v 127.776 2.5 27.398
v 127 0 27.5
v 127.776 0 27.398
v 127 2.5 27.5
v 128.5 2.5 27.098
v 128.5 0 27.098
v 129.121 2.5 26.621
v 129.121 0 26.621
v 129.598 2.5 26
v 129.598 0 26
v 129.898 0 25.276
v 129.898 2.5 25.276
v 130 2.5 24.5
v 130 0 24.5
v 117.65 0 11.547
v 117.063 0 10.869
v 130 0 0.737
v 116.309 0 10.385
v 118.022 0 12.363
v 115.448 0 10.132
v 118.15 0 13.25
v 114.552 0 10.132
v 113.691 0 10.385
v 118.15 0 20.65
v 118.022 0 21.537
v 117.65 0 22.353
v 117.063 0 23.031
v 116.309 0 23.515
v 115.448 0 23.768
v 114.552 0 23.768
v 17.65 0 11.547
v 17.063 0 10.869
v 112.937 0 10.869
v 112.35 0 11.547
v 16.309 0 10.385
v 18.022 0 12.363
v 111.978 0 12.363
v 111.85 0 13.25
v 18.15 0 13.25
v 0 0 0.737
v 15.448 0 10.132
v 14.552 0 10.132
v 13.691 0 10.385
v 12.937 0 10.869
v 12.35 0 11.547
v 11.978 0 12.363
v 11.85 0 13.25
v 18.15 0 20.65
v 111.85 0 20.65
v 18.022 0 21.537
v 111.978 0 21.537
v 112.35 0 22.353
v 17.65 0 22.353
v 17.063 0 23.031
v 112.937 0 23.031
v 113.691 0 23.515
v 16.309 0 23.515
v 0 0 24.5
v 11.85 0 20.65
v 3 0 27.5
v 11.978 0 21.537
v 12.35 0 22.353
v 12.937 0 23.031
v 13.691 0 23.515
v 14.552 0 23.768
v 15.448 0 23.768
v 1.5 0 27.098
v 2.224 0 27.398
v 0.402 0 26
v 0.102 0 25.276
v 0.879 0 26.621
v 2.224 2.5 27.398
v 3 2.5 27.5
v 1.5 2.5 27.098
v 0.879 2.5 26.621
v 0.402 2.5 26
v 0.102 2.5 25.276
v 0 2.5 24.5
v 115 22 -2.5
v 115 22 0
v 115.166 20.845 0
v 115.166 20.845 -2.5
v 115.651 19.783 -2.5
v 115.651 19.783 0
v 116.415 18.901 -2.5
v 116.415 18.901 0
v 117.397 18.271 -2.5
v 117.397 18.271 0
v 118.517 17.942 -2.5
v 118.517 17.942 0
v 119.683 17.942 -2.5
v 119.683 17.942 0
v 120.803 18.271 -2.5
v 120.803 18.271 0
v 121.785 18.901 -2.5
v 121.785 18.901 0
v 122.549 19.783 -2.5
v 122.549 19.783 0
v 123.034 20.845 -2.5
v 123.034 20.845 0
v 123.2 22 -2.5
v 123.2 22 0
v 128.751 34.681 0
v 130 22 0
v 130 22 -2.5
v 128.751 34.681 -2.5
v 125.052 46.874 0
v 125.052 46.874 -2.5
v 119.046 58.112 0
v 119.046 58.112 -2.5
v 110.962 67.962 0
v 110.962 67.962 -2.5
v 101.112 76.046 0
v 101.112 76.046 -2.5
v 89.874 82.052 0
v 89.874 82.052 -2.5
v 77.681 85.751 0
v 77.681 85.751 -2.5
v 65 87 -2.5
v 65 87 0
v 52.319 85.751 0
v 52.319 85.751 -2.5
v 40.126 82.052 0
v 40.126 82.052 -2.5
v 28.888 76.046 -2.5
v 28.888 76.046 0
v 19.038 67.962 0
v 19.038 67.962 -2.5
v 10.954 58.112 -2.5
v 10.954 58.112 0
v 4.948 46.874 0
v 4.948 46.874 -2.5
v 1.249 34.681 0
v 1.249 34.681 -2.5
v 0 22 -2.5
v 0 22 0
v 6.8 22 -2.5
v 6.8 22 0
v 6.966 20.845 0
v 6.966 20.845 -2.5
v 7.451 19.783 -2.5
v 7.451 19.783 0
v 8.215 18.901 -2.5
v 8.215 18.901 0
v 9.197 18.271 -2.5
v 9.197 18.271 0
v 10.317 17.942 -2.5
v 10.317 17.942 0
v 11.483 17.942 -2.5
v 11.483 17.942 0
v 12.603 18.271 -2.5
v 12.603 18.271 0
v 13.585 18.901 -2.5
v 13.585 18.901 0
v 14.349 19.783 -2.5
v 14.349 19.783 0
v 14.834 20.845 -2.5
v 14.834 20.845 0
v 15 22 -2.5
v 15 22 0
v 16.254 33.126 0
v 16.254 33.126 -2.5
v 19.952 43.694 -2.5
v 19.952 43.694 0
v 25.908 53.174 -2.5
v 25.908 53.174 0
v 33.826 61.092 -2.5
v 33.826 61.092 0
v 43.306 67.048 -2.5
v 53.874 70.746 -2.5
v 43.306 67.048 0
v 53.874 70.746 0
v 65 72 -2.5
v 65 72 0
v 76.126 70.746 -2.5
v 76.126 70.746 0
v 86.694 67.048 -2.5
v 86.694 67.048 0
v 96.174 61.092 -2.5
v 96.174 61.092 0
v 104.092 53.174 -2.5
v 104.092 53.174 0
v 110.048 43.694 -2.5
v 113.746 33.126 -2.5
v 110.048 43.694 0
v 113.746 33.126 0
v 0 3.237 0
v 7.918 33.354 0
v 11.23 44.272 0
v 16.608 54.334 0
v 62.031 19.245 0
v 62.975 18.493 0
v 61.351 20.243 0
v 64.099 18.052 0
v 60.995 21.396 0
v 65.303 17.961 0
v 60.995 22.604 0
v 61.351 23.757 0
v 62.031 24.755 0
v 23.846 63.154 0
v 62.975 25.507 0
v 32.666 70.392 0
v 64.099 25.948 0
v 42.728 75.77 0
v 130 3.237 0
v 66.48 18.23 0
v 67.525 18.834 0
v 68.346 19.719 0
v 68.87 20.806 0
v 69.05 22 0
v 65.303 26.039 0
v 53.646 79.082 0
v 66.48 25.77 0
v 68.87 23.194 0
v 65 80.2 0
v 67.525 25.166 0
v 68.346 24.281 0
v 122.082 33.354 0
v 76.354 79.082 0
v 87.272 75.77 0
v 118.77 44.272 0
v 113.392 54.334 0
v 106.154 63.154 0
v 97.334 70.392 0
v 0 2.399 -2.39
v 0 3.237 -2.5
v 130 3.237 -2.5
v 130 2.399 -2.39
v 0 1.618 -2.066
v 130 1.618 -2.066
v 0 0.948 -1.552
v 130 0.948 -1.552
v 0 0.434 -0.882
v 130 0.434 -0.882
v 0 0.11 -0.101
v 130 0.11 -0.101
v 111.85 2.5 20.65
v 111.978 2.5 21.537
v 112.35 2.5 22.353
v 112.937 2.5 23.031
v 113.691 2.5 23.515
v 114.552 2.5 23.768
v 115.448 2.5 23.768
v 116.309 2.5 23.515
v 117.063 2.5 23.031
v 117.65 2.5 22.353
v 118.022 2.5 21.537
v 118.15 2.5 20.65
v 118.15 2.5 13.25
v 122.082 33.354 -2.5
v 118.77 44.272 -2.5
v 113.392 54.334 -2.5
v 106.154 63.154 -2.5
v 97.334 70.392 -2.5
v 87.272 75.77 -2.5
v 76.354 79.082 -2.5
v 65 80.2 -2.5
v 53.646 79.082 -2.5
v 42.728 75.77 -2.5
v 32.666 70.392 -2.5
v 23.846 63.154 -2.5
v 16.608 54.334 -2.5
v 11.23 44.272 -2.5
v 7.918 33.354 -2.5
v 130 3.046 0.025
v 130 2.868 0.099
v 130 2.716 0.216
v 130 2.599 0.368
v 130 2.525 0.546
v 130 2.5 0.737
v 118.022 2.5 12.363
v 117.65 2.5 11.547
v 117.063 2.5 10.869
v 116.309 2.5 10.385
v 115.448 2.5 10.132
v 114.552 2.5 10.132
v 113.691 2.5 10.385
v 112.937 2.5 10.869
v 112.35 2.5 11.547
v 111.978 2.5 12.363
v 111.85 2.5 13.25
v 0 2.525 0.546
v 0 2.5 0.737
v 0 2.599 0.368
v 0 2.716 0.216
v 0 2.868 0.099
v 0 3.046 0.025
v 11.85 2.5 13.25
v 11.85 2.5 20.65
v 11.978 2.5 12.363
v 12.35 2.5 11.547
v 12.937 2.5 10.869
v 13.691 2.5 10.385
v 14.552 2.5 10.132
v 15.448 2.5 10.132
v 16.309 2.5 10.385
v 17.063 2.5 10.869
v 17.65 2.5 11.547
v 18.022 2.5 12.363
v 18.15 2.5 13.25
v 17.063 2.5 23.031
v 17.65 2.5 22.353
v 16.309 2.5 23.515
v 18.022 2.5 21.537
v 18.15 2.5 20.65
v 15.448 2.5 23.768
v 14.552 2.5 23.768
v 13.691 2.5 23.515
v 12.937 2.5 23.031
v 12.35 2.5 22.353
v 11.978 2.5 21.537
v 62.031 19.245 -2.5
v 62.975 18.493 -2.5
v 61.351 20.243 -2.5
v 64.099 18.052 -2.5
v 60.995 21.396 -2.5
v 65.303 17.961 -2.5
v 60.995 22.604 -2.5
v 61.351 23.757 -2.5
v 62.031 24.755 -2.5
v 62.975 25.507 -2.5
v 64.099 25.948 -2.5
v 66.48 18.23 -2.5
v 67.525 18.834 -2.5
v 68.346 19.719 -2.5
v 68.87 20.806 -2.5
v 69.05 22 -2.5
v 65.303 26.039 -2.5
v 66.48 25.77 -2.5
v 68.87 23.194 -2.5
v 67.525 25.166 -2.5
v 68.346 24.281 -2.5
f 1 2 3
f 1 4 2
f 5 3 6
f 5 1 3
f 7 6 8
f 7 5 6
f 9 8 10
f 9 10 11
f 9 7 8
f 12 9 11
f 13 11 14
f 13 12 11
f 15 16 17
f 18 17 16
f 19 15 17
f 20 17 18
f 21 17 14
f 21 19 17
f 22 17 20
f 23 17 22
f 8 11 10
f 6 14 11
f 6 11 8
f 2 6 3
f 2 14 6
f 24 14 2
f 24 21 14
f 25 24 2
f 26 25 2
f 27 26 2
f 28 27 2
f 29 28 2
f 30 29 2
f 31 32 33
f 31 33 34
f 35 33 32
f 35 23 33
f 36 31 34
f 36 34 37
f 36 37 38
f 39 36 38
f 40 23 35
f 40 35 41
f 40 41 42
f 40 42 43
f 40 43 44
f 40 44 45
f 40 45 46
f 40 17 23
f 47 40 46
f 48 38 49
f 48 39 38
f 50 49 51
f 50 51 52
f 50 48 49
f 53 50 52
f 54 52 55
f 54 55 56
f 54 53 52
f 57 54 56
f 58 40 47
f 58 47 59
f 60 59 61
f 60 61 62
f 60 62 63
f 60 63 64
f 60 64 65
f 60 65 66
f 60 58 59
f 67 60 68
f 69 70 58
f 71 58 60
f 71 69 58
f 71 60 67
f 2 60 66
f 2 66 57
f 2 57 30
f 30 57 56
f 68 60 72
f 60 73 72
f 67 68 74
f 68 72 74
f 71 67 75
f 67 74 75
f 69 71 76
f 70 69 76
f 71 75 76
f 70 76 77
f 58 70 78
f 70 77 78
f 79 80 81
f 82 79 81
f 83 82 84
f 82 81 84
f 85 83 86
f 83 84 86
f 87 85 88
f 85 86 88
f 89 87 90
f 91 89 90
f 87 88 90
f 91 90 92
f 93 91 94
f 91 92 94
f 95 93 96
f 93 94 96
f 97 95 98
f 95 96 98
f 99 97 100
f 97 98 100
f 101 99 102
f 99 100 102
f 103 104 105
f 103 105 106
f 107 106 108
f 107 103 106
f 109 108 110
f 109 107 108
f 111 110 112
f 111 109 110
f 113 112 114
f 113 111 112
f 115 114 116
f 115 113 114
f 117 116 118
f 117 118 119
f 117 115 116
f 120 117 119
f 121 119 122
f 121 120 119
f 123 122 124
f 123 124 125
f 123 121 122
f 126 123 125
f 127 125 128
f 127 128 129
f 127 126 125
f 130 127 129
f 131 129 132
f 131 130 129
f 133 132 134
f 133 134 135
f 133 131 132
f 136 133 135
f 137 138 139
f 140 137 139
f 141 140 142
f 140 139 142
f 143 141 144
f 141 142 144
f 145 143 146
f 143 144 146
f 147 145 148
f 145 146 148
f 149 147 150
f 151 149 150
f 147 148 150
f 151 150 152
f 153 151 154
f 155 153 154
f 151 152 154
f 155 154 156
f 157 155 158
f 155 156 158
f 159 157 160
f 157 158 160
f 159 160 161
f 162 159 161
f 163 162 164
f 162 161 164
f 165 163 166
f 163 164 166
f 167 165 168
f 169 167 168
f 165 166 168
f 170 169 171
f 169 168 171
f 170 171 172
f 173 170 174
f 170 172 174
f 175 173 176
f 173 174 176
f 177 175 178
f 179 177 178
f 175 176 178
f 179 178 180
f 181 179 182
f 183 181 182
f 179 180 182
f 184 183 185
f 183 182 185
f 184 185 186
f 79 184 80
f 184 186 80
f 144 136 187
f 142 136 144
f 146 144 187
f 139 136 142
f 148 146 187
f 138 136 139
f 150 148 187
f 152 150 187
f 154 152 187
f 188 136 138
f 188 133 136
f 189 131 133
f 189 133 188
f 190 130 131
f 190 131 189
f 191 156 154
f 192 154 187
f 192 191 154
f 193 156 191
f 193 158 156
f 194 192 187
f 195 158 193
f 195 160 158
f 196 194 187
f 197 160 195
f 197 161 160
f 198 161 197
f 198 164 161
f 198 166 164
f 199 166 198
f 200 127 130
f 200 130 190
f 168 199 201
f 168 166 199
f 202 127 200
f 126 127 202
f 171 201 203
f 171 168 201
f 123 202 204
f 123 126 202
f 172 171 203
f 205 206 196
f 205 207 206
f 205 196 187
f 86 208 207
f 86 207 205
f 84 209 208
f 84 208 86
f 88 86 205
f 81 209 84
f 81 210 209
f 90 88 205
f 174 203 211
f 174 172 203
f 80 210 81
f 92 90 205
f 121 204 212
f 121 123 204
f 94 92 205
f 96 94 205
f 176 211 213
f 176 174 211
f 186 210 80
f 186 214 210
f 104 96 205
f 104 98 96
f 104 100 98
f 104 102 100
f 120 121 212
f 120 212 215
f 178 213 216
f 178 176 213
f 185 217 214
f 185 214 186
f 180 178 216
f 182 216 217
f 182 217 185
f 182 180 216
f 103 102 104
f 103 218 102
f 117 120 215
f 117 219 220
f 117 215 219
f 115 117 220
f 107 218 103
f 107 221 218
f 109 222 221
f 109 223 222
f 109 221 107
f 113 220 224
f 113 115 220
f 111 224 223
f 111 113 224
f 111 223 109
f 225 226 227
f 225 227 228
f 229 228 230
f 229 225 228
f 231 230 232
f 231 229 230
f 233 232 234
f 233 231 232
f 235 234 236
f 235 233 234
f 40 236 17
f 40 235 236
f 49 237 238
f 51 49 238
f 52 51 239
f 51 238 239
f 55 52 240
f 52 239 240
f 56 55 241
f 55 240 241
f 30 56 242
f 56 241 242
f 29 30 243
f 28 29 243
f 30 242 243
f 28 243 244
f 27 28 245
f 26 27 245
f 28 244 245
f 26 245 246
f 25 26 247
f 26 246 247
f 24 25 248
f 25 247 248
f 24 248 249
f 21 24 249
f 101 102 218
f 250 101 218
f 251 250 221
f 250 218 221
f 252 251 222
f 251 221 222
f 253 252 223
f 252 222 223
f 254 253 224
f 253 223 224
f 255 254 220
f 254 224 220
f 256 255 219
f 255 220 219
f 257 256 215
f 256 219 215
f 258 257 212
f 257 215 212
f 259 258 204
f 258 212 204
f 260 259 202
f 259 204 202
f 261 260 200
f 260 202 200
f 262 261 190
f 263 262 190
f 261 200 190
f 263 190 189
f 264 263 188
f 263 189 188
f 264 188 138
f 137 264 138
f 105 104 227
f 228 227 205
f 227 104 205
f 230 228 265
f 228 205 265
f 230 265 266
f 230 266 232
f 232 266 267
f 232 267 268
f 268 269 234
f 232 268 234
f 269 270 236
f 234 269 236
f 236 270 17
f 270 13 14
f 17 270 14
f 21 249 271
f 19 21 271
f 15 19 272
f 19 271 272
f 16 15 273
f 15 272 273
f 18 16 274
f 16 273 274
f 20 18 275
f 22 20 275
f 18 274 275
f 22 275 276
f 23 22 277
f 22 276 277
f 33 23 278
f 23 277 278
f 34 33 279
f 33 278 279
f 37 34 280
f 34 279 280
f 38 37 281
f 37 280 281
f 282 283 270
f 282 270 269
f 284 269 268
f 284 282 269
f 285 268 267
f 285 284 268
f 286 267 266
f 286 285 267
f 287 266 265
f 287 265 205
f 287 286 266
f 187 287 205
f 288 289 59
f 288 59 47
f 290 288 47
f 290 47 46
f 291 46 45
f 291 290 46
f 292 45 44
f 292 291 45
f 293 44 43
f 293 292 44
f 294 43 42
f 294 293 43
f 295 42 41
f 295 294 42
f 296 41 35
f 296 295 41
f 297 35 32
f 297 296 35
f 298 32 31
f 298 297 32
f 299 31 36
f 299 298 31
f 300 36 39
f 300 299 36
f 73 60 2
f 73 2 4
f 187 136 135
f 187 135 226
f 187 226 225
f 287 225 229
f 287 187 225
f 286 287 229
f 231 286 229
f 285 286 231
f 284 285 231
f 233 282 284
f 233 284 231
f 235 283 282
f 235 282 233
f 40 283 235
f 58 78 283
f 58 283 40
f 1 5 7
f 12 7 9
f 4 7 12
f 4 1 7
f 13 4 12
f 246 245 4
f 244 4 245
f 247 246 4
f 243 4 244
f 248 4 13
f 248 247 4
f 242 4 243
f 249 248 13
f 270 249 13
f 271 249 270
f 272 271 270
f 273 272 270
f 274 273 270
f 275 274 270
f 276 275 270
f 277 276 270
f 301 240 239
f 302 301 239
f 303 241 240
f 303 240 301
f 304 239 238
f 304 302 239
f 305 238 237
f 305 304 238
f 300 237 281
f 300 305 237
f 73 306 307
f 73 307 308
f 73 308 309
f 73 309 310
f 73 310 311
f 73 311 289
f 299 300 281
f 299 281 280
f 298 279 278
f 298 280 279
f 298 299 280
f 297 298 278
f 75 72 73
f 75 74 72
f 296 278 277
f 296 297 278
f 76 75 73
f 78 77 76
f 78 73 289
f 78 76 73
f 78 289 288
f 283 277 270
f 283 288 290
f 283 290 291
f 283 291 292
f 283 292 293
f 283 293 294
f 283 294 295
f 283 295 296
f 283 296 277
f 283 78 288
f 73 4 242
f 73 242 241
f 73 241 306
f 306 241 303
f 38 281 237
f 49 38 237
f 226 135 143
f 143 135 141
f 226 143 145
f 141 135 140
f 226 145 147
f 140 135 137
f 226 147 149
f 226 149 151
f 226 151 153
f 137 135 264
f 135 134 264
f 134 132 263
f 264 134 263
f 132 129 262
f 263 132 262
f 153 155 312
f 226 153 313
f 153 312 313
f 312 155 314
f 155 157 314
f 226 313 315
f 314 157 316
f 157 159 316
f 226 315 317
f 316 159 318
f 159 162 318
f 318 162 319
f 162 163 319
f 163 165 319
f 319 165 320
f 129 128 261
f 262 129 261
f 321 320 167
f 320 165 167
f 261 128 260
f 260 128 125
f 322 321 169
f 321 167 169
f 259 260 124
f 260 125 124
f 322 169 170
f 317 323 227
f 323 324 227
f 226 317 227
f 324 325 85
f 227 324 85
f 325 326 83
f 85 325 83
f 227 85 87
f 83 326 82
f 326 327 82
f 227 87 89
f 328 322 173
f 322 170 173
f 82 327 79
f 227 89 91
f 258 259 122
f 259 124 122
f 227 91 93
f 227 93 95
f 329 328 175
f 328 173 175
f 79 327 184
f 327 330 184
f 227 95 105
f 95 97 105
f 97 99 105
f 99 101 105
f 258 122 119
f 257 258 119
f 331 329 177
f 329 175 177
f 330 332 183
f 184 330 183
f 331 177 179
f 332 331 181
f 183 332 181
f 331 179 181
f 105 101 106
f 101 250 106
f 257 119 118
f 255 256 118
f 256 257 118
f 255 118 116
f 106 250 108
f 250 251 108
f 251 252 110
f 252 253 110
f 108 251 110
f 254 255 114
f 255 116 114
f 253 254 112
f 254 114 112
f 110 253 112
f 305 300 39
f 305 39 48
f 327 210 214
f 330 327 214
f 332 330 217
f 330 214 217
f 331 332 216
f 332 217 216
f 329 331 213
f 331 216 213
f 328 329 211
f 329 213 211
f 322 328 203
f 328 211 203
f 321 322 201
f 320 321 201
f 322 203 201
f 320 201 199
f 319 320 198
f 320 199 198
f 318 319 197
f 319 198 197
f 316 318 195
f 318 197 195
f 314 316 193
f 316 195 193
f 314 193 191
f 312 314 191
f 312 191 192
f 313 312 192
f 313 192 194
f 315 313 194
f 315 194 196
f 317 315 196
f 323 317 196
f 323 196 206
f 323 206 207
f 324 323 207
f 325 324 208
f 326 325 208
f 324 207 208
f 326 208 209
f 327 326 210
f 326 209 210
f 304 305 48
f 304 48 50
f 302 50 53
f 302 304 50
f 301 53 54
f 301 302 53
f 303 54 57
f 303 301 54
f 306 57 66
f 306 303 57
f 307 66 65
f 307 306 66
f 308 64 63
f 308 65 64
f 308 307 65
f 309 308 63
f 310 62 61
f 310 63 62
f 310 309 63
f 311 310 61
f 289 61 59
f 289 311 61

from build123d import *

# Parameters (mm, degrees)
ESQUISSE1_R                           = 4.05
T_LE_DE_BASE_PLI_E1_DEPTH             = 2.5
T_LE_PLI_E_SUR_AR_TE1_STRIP_W         = 11.4732
T_LE_PLI_E_SUR_AR_TE1_STRIP_H         = 2.5
T_LE_PLI_E_SUR_AR_TE1_STRIP_CUT_DEPTH = 130
T_LE_PLI_E_SUR_AR_TE1_DEPTH           = 130
CONG_1_R                              = 3
ENL_V_MAT_EXTRU_1_DEPTH               = 10


# Sheet-metal steps are written as plain solids
with BuildPart() as part:
    # Esquisse1 → Tôle de base pliée1 (new body)
    with BuildSketch(Plane.XY):
        with BuildLine():
            Line((0, 0), (130, 0))
            Line((130, 0), (130, 22))
            ThreePointArc((130, 22), (65, 87), (0, 22))
            Line((0, 22), (0, 0))
        make_face()
        with Locations((65, 22)):
            Circle(ESQUISSE1_R, mode=Mode.SUBTRACT)
        with BuildLine():
            ThreePointArc((123.2, 22), (65, 80.2), (6.8, 22))
            ThreePointArc((6.8, 22), (10.9, 17.9), (15, 22))
            ThreePointArc((15, 22), (65, 72), (115, 22))
            ThreePointArc((115, 22), (119.1, 17.9), (123.2, 22))
        make_face(mode=Mode.SUBTRACT)
    extrude(amount=-T_LE_DE_BASE_PLI_E1_DEPTH)

    # Tôle pliée sur arête1 strip (across the edge) → Tôle pliée sur arête1 strip cut (cut)
    with BuildSketch(Plane.YZ):
        with Locations((-2.5, -1.25)):
            Rectangle(T_LE_PLI_E_SUR_AR_TE1_STRIP_W, T_LE_PLI_E_SUR_AR_TE1_STRIP_H)
    extrude(amount=T_LE_PLI_E_SUR_AR_TE1_STRIP_CUT_DEPTH, mode=Mode.SUBTRACT)

    # Tôle pliée sur arête1 section (across the edge) → Tôle pliée sur arête1 (add)
    with BuildSketch(Plane.YZ):
        with BuildLine():
            Line((0, 0.7366), (0, 27.5))
            Line((0, 27.5), (2.5, 27.5))
            Line((2.5, 27.5), (2.5, 0.7366))
            ThreePointArc((2.5, 0.7366), (2.715745145, 0.215745145), (3.2366, 0))
            Line((3.2366, 0), (3.2366, -2.5))
            ThreePointArc((3.2366, -2.5), (0.947978192, -1.552021808), (0, 0.7366))
        make_face()
    extrude(amount=T_LE_PLI_E_SUR_AR_TE1_DEPTH)

    # Congé1
    cong_1_edges = [part.edges().sort_by_distance(p)[0] for p in [
        (0, 1.25, 27.5),
        (130, 1.25, 27.5),
    ]]
    fillet(cong_1_edges, radius=CONG_1_R)

    # Esquisse9 → Enlèv. mat.-Extru.1 (cut)
    with BuildSketch(Plane(origin=(0, 2.5, 0), x_dir=(1, 0, 0), z_dir=(0, 1, 0))):
        with BuildLine():
            Line((18.15, -13.25), (18.15, -20.65))
            ThreePointArc((18.15, -20.65), (15, -23.8), (11.85, -20.65))
            Line((11.85, -20.65), (11.85, -13.25))
            ThreePointArc((11.85, -13.25), (15, -10.1), (18.15, -13.25))
        make_face()
        with BuildLine():
            Line((111.85, -13.25), (111.85, -20.65))
            ThreePointArc((111.85, -20.65), (115, -23.8), (118.15, -20.65))
            Line((118.15, -20.65), (118.15, -13.25))
            ThreePointArc((118.15, -13.25), (115, -10.1), (111.85, -13.25))
        make_face()
    extrude(amount=-ENL_V_MAT_EXTRU_1_DEPTH, mode=Mode.SUBTRACT)


solid = part.part
